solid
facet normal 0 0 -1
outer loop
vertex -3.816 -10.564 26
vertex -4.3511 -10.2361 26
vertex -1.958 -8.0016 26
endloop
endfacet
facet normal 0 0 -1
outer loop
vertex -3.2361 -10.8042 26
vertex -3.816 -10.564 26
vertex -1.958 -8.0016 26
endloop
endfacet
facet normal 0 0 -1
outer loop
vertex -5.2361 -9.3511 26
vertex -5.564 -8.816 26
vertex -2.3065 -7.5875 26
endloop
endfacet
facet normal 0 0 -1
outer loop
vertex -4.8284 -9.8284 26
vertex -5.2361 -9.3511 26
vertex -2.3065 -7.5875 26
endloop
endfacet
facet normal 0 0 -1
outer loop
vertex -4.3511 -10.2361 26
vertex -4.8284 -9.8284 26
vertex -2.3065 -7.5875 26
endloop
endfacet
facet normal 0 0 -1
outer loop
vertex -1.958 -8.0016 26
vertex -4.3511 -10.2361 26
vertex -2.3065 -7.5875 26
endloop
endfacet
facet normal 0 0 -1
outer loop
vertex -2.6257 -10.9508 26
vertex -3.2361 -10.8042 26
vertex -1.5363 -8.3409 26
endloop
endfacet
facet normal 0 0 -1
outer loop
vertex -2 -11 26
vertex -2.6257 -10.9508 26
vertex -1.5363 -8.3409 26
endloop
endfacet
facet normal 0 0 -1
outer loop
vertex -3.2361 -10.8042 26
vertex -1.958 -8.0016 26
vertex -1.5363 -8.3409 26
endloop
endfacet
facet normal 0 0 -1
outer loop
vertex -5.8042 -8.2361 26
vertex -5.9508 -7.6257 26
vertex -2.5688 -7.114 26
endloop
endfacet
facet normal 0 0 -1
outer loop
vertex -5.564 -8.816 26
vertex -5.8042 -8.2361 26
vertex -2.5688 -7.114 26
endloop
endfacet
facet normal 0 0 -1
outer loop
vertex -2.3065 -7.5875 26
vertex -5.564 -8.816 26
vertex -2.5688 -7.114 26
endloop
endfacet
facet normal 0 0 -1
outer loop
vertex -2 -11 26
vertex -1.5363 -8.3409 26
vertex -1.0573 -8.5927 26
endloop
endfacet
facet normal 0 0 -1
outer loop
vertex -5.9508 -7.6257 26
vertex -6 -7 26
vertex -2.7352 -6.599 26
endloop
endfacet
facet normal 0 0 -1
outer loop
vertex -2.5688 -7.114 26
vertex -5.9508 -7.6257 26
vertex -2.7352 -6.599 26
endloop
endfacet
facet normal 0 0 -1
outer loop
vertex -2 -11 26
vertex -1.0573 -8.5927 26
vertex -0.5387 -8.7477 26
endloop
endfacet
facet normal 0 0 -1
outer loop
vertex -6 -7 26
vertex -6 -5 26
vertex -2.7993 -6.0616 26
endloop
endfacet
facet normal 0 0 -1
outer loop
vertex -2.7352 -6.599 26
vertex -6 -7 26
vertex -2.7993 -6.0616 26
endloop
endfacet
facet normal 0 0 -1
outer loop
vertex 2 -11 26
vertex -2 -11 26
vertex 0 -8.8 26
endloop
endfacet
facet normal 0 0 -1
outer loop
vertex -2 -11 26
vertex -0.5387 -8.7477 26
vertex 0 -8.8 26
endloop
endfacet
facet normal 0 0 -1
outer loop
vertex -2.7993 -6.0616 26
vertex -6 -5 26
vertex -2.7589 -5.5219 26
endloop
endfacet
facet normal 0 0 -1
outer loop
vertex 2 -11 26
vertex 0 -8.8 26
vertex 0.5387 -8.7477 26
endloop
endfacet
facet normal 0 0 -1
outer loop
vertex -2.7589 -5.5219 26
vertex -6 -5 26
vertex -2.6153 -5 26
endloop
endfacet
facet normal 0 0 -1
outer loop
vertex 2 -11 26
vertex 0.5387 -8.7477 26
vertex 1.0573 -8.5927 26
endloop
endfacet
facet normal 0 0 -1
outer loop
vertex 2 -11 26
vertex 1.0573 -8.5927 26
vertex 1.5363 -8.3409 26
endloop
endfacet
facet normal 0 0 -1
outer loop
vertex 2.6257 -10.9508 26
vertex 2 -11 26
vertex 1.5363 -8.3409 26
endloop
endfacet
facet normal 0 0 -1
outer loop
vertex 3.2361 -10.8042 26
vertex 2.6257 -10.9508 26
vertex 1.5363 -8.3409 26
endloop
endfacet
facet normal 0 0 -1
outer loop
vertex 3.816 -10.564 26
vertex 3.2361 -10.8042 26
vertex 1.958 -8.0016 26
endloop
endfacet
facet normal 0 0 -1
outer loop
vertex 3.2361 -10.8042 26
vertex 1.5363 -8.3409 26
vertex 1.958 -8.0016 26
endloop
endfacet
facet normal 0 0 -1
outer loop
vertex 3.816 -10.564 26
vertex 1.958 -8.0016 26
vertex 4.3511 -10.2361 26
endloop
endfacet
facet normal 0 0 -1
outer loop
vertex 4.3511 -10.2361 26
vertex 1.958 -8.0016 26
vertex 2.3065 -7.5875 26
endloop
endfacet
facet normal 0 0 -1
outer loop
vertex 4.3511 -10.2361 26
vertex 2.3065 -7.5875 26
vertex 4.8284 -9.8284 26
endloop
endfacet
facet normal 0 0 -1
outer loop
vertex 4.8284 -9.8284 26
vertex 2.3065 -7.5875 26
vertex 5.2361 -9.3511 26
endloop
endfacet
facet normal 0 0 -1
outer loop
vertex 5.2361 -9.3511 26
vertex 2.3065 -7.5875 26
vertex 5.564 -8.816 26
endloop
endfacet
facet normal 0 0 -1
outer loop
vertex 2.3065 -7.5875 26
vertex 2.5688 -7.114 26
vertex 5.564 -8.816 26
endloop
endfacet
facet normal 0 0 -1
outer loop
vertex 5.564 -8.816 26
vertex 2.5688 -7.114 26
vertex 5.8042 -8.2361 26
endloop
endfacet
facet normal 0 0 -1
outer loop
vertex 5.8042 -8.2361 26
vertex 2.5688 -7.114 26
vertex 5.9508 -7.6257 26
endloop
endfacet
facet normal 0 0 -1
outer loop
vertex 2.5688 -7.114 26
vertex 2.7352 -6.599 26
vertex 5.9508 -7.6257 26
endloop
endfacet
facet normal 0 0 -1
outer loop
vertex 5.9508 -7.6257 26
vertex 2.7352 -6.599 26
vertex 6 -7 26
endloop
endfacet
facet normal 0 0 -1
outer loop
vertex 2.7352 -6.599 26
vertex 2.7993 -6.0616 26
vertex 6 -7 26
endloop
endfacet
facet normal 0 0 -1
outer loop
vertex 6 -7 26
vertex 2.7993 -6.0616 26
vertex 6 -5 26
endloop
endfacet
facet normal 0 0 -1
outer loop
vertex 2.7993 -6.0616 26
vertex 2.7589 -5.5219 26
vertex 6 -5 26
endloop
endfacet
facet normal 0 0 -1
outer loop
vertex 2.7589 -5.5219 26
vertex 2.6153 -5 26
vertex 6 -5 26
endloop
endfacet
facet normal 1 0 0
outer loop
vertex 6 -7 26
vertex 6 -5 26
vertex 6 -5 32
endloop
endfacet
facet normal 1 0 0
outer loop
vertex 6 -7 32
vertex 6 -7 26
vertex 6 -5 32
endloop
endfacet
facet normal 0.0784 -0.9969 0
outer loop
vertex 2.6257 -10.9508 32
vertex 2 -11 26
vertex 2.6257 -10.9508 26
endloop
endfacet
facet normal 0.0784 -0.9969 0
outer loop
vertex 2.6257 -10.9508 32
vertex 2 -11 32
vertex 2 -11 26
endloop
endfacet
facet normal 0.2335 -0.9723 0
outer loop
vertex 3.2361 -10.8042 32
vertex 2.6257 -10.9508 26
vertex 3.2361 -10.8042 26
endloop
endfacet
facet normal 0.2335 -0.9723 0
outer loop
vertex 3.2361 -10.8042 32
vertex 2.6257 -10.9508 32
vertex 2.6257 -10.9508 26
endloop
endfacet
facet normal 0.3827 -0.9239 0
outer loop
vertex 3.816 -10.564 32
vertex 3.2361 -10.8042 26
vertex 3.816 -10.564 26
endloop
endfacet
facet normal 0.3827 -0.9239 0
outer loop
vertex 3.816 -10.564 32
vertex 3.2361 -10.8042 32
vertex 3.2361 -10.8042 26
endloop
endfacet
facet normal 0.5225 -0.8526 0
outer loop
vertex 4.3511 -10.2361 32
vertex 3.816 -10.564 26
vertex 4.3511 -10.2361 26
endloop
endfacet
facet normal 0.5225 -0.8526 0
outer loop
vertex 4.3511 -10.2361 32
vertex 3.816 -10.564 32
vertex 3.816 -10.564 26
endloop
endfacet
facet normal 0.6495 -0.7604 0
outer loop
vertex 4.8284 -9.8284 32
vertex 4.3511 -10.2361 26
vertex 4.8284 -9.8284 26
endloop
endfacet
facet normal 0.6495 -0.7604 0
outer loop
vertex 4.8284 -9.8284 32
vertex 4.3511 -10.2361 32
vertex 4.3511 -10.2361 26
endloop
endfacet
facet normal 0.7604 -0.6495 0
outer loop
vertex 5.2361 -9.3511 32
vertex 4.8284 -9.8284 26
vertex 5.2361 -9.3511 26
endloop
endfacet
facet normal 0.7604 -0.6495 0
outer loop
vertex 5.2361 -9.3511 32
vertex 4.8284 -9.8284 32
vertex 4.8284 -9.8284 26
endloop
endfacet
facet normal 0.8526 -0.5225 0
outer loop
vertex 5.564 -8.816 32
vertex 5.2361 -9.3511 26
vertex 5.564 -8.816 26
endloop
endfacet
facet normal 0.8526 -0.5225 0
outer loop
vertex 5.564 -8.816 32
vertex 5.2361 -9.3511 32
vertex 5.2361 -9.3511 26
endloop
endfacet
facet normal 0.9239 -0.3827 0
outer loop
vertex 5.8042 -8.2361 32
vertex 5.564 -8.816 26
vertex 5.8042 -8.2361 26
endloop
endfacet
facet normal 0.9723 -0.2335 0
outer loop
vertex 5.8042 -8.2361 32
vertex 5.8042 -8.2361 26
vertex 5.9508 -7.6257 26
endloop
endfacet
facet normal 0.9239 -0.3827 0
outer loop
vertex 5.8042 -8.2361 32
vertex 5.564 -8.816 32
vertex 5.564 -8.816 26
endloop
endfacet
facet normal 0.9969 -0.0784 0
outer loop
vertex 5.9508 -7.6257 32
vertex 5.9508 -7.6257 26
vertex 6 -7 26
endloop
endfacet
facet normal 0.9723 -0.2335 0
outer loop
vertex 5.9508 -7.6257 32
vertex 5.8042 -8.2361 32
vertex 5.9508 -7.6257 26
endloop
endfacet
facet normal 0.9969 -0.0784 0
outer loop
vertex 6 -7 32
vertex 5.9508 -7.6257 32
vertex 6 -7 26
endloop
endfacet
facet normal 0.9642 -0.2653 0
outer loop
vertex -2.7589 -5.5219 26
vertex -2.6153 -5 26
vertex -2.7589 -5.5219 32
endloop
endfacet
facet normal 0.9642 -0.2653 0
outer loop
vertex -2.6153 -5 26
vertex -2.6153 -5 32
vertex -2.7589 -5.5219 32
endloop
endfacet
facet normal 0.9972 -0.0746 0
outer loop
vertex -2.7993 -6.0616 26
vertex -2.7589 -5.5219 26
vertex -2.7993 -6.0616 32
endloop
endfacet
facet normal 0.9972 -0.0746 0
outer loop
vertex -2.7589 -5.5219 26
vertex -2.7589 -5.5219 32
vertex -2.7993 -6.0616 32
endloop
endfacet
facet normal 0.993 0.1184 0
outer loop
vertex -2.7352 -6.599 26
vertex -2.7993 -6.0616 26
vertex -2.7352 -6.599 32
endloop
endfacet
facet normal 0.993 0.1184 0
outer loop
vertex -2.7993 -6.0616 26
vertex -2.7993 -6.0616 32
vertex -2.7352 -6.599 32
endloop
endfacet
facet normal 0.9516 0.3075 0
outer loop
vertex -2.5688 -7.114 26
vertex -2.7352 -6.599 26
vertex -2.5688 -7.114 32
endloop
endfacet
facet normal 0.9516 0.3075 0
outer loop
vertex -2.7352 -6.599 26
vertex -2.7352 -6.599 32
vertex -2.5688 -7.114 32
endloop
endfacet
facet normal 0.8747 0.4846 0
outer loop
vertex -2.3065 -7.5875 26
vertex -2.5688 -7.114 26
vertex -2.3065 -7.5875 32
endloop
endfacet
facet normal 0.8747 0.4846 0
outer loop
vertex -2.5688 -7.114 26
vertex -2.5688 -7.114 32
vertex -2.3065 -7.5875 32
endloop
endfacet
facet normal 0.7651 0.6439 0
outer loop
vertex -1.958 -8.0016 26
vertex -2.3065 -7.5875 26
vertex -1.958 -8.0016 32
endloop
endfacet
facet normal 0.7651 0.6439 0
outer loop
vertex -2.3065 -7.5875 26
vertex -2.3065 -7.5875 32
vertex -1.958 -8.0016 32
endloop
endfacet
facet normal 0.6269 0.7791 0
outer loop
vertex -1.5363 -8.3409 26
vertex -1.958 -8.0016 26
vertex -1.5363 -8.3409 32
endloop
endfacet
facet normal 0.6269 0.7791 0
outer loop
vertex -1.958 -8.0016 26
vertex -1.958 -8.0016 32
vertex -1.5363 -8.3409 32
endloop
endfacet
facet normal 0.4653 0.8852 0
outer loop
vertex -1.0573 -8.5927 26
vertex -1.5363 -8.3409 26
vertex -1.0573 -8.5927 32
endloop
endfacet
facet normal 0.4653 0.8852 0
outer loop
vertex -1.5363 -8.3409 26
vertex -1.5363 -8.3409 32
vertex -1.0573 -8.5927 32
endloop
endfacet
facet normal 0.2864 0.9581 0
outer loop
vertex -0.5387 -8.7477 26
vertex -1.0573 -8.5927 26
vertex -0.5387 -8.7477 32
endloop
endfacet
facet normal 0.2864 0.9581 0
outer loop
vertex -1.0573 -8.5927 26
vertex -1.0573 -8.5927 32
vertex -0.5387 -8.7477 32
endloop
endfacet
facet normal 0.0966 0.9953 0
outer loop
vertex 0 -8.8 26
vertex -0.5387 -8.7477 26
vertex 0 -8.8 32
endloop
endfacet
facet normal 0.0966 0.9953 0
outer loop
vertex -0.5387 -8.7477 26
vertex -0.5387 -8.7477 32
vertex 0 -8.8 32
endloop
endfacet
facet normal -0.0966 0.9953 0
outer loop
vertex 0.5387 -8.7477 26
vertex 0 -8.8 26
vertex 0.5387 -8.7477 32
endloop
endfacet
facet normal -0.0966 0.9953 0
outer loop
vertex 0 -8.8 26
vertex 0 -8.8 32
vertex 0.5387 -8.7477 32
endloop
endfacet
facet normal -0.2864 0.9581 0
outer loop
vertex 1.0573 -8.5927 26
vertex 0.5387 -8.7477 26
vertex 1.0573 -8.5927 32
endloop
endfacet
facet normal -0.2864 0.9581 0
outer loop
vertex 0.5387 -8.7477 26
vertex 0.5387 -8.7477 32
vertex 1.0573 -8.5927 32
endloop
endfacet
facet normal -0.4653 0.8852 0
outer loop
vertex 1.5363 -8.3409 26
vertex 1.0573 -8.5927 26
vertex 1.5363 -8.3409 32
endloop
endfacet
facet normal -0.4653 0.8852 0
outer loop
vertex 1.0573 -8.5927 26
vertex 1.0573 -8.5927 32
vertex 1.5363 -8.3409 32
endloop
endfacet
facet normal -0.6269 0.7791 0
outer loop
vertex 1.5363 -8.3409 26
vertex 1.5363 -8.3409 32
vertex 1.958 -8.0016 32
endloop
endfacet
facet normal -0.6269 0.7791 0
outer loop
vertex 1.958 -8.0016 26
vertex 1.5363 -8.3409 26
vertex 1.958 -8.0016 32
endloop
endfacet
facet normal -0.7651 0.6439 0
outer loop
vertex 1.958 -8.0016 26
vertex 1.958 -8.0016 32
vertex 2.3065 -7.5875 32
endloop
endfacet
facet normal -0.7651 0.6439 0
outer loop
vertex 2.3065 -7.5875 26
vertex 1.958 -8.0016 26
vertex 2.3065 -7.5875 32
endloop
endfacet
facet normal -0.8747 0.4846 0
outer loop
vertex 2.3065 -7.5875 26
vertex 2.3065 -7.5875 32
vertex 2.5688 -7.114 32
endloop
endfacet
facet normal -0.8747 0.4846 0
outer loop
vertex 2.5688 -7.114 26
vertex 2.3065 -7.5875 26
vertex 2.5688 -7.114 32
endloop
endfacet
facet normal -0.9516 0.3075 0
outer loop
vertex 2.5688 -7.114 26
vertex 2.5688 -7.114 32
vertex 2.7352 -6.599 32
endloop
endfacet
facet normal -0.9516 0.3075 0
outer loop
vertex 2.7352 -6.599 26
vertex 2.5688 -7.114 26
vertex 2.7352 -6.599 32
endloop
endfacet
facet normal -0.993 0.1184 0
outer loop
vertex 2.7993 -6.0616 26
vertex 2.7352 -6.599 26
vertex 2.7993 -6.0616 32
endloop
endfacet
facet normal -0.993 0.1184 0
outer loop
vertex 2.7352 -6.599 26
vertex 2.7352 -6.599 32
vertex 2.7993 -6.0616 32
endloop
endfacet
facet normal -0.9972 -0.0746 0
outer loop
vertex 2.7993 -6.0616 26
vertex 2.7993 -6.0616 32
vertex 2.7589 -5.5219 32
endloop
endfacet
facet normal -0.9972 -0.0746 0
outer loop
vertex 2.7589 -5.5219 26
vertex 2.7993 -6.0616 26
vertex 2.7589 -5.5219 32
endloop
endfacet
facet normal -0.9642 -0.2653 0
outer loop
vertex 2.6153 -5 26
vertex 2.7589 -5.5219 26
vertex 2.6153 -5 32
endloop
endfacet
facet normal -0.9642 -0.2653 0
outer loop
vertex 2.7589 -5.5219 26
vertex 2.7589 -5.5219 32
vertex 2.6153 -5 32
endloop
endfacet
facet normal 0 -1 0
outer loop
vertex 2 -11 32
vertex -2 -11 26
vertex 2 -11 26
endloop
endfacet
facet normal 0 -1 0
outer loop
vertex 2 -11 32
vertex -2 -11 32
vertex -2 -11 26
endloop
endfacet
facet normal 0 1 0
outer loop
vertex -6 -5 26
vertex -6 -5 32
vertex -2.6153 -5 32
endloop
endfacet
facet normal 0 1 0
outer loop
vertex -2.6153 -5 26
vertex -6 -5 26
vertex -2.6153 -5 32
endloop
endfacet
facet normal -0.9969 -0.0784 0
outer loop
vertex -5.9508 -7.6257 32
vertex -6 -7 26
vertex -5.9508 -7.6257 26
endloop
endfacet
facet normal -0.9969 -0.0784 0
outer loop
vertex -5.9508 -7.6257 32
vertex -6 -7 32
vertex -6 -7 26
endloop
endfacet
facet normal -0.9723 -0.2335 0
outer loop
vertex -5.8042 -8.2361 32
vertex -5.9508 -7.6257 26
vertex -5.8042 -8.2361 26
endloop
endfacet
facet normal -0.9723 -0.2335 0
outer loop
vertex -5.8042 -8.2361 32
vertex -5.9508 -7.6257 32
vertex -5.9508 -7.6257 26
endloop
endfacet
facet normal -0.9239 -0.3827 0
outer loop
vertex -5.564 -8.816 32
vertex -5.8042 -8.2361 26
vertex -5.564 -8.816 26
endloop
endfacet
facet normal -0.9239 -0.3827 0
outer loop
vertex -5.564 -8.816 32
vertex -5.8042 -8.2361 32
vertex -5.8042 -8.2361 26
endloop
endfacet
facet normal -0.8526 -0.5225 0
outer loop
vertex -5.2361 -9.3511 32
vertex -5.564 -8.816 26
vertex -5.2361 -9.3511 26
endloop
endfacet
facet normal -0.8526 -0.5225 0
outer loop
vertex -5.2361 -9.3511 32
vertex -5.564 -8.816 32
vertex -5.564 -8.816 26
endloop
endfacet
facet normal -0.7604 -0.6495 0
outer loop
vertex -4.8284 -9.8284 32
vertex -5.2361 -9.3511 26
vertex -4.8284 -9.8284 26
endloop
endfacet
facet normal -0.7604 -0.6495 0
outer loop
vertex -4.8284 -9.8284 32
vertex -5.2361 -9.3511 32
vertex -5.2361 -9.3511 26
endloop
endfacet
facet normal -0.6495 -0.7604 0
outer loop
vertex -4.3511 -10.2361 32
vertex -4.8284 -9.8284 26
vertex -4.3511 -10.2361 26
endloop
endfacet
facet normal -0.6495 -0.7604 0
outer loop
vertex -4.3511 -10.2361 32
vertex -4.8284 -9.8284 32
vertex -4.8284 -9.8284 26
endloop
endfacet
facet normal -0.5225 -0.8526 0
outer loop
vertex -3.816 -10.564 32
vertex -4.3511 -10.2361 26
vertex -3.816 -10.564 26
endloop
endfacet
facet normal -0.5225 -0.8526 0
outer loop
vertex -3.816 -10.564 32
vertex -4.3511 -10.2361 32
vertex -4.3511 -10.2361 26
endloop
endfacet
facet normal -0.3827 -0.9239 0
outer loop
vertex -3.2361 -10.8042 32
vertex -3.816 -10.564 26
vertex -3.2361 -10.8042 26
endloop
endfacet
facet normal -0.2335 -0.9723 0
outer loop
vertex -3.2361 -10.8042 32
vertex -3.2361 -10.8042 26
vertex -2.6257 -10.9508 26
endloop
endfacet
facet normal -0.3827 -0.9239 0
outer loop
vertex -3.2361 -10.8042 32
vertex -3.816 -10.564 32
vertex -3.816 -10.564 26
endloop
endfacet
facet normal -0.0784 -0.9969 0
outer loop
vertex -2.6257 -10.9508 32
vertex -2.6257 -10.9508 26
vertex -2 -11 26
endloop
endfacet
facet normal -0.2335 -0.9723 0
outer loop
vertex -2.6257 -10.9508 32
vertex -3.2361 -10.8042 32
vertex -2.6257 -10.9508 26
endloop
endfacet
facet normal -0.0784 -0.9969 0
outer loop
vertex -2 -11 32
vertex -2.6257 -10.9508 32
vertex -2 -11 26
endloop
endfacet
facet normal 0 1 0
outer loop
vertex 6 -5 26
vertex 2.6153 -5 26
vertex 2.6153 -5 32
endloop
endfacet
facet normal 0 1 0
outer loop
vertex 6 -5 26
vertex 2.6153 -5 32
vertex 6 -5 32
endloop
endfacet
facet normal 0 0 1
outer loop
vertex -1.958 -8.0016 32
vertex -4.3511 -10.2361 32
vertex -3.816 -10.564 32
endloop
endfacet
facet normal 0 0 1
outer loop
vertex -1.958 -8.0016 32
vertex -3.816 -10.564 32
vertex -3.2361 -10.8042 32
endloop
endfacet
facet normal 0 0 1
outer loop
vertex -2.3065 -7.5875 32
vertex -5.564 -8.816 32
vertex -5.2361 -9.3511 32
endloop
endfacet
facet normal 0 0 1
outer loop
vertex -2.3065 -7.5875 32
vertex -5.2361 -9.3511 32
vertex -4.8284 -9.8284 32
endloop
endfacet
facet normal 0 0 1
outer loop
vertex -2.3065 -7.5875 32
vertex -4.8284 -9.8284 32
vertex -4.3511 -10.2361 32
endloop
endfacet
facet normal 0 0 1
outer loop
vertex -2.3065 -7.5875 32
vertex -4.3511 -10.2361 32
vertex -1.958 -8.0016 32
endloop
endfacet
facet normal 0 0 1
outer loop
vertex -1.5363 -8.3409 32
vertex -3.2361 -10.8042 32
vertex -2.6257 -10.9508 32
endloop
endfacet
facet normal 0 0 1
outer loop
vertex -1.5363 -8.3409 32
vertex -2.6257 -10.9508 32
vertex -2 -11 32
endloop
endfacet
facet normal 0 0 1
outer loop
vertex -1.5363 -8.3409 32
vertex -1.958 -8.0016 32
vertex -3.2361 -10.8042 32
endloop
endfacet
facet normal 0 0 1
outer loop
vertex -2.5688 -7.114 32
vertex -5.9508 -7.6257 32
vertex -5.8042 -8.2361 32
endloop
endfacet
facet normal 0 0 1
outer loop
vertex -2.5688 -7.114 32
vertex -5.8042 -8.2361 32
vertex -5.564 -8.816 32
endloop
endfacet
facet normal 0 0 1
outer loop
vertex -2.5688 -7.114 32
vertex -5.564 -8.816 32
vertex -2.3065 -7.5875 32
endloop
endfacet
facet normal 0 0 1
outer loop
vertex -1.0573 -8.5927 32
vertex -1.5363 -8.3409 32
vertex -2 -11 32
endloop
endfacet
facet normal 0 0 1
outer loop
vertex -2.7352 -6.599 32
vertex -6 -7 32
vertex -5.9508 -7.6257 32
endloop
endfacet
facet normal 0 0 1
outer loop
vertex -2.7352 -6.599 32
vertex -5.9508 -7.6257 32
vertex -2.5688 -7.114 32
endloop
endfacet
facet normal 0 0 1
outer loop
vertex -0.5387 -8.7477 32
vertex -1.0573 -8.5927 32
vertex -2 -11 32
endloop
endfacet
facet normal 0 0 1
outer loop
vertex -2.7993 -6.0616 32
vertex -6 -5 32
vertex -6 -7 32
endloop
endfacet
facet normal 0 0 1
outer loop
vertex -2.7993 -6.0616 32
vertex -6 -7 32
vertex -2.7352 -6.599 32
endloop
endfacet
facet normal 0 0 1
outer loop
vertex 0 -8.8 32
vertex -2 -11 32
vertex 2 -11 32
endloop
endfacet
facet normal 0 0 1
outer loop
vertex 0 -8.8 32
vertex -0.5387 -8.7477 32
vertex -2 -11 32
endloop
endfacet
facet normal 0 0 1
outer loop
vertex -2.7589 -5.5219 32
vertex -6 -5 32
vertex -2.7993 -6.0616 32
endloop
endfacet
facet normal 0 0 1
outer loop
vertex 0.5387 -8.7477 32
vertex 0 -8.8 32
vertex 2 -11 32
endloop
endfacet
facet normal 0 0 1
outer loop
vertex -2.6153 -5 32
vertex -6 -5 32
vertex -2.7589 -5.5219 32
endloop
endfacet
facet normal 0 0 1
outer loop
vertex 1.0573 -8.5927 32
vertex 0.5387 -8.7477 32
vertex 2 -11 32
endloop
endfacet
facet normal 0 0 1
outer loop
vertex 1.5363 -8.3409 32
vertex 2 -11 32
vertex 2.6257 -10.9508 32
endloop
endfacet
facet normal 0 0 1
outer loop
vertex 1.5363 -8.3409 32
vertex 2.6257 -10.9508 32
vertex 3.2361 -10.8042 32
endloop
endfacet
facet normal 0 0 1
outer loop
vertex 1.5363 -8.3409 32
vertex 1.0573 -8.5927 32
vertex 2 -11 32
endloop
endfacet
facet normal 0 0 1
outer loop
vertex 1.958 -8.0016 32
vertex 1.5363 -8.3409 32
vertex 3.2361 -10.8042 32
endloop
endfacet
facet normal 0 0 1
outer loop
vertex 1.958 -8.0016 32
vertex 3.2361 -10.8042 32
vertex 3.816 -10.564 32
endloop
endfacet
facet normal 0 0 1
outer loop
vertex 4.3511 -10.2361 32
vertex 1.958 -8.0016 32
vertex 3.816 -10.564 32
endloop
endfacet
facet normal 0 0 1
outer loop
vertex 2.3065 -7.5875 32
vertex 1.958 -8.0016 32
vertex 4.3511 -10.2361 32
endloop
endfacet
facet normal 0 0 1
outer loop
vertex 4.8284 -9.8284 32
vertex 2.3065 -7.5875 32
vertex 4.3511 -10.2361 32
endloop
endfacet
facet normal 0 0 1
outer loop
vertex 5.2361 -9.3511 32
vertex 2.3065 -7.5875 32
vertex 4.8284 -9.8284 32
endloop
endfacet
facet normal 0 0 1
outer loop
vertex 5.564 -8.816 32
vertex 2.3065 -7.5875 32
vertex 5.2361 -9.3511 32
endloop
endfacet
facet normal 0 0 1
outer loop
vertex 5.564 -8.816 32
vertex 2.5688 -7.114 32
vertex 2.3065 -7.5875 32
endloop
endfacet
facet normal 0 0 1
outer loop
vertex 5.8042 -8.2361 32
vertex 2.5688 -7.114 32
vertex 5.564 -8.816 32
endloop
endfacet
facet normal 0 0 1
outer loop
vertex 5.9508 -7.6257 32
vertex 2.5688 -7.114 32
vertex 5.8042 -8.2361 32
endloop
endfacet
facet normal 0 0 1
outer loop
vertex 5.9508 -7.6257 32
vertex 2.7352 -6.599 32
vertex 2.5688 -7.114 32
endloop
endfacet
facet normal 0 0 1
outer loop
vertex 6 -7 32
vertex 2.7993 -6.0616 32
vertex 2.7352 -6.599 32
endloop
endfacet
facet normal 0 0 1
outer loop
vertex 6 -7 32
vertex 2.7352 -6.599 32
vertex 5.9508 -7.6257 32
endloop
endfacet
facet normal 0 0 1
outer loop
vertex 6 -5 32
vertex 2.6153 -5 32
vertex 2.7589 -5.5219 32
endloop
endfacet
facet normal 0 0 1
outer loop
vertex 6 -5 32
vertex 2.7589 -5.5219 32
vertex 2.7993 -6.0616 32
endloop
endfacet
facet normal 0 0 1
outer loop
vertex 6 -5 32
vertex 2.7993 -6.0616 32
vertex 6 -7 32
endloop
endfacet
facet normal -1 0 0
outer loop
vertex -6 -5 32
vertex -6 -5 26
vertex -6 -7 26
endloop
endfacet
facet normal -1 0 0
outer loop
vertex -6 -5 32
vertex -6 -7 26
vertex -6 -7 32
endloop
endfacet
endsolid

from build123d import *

# Parameters (mm, degrees)
SKETCH006_W     = 12
SKETCH006_H     = 6
PAD002_DEPTH    = 6
SKETCH007_R     = 2.8
POCKET004_DEPTH = 6.001
FILLET_R        = 4


with BuildPart() as part:
    # Sketch006 → Pad002 (new body)
    with BuildSketch(Plane.XZ.offset(5)):
        with Locations((0, 29)):
            Rectangle(SKETCH006_W, SKETCH006_H)
    extrude(amount=PAD002_DEPTH)

    # Sketch007 → Pocket004 (cut, through all)
    with BuildSketch(Plane(origin=(0, -5, 32), x_dir=(-1, 0, 0), z_dir=(0, 0, 1))):
        with Locations((0, 1)):
            Circle(SKETCH007_R)
    extrude(amount=-POCKET004_DEPTH, mode=Mode.SUBTRACT)

    # Fillet
    fillet_edges = [part.edges().sort_by_distance(p)[0] for p in [
        (-6, -11, 29),
        (6, -11, 29),
    ]]
    fillet(fillet_edges, radius=FILLET_R)


solid = part.part
